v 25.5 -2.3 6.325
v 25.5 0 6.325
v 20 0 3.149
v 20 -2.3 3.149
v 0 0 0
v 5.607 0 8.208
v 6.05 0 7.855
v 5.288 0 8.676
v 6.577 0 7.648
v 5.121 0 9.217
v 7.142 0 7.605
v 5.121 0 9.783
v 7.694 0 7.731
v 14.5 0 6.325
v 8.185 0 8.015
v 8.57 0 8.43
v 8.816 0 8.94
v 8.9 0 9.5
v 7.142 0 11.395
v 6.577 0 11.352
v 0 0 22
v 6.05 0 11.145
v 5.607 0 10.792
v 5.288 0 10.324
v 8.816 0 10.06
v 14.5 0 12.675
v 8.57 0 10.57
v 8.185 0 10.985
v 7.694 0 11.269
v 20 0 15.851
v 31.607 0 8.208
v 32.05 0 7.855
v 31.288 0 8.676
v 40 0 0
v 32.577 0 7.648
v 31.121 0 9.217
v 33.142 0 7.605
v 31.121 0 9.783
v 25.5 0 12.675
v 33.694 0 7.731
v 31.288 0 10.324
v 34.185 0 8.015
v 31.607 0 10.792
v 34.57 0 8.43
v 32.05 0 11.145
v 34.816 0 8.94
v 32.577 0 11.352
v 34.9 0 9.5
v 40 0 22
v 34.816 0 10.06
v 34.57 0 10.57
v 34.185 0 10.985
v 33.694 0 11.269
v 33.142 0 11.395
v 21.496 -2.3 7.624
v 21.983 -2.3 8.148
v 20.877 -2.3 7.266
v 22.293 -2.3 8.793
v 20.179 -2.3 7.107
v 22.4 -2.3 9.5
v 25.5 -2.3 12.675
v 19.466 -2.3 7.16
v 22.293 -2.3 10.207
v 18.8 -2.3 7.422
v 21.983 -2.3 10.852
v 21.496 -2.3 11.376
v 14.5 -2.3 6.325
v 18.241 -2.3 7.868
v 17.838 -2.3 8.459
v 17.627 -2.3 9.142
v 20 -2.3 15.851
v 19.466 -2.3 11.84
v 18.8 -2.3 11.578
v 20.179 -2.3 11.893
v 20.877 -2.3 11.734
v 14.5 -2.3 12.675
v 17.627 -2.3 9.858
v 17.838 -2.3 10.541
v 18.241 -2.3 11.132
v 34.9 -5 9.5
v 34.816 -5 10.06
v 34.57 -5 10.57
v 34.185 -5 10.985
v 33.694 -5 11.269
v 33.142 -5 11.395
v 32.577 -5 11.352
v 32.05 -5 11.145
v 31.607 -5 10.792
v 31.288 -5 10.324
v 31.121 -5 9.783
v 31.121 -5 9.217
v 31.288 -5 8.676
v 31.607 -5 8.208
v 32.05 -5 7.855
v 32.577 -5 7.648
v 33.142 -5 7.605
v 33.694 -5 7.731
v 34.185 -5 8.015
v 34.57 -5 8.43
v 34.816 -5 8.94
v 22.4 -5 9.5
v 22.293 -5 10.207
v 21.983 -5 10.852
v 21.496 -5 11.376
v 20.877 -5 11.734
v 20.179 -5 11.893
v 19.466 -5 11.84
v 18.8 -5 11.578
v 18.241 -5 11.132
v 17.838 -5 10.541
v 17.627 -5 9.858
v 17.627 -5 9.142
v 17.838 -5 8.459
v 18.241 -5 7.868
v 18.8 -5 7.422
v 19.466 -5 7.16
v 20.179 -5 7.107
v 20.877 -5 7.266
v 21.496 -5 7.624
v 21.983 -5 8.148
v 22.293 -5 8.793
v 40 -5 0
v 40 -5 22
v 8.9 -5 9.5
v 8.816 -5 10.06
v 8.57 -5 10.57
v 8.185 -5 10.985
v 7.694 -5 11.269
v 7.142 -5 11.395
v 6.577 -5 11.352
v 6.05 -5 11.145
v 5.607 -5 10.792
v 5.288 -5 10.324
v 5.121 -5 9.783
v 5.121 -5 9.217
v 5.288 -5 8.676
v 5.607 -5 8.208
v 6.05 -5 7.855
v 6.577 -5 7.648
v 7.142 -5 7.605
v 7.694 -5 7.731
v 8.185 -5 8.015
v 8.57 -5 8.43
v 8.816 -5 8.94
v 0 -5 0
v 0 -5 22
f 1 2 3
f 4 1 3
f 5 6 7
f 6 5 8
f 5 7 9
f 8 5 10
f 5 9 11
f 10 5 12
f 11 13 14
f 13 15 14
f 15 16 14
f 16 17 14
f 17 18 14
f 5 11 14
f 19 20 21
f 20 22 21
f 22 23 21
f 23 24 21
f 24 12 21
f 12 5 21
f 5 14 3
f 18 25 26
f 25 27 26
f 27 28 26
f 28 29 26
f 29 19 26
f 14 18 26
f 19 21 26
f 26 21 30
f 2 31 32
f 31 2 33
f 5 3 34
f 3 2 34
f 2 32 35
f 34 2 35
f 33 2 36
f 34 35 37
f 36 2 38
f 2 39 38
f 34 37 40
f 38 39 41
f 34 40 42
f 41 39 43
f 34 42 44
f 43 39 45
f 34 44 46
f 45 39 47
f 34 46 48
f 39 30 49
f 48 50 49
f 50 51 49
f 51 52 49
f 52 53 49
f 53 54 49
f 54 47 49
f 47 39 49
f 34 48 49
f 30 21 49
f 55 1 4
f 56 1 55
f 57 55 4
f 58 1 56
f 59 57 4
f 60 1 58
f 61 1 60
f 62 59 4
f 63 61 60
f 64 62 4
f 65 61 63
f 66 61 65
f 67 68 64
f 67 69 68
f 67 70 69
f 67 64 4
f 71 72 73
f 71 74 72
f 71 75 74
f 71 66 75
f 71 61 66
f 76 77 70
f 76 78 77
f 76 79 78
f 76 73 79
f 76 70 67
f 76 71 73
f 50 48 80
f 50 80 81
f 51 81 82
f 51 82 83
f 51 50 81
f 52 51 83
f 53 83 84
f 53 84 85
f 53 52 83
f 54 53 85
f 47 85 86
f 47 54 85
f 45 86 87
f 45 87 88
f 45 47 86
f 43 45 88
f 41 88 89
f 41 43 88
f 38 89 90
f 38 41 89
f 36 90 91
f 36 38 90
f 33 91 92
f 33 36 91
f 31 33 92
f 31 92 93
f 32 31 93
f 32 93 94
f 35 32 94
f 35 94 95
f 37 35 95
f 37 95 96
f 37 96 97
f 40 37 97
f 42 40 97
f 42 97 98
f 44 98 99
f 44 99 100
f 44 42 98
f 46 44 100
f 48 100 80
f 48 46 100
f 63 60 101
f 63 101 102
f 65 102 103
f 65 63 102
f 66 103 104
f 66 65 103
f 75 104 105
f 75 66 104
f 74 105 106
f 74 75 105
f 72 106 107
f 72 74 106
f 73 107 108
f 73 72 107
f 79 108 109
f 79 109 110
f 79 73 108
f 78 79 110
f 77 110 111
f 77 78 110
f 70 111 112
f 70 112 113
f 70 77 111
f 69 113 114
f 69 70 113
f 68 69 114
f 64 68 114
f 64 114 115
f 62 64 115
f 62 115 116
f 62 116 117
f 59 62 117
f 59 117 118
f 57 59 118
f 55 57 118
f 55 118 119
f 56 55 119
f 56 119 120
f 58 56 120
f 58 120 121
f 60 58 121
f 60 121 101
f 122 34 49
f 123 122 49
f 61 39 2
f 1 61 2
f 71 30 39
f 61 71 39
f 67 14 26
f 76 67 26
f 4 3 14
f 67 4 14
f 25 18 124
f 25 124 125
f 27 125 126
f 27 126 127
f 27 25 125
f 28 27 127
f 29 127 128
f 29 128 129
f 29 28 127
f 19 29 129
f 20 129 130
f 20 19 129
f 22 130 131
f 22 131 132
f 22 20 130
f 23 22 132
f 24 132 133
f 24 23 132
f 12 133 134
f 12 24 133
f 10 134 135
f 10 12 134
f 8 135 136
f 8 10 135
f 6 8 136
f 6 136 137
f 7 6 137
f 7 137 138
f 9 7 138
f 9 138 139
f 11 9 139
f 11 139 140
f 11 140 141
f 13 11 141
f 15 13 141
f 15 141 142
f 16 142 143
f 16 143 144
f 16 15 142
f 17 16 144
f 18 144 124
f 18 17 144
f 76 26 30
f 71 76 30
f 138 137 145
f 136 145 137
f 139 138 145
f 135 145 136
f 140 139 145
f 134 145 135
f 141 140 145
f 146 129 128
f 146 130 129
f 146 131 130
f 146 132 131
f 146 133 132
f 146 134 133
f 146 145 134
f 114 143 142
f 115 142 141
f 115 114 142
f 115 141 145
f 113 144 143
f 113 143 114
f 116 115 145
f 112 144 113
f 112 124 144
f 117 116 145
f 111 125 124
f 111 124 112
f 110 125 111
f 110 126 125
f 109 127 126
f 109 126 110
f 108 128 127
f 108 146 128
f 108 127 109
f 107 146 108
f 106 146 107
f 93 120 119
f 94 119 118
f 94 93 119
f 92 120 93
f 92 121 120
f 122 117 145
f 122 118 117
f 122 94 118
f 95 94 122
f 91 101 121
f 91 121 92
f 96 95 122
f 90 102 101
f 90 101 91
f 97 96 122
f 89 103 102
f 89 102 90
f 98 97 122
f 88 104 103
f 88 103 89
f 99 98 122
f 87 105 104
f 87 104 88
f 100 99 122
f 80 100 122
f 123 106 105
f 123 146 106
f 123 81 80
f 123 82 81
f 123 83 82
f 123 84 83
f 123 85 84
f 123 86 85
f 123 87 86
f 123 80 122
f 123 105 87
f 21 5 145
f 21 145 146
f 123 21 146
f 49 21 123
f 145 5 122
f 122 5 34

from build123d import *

# Parameters (mm, degrees)
F0_W     = 40
F0_H     = 22
F0_R     = 1.9
F0_R_2   = 2.4
F1_DEPTH = 5
F3_DEPTH = 2.3


with BuildPart() as f1:
    # F0 (on Front) → F1 (new body)
    with BuildSketch(Plane.XZ):
        with Locations((20, 11)):
            Rectangle(F0_W, F0_H)
        with Locations((7, 9.5)):
            Circle(F0_R, mode=Mode.SUBTRACT)
        with Locations((20, 9.5)):
            Circle(F0_R_2, mode=Mode.SUBTRACT)
        with Locations((33, 9.5)):
            Circle(F0_R, mode=Mode.SUBTRACT)
    extrude(amount=F1_DEPTH)

    # F2 (on face) → F3 (cut)
    with BuildSketch(Plane(origin=(0, 0, 0), x_dir=(-1, 0, 0), z_dir=(0, 1, 0))):
        Polygon((-14.5, 6.324574), (-14.5, 12.675426), (-20, 15.850853), (-25.5, 12.675426), (-25.5, 6.324574), (-20, 3.149147), align=None)
    extrude(amount=-F3_DEPTH, mode=Mode.SUBTRACT)


solid = f1.part
